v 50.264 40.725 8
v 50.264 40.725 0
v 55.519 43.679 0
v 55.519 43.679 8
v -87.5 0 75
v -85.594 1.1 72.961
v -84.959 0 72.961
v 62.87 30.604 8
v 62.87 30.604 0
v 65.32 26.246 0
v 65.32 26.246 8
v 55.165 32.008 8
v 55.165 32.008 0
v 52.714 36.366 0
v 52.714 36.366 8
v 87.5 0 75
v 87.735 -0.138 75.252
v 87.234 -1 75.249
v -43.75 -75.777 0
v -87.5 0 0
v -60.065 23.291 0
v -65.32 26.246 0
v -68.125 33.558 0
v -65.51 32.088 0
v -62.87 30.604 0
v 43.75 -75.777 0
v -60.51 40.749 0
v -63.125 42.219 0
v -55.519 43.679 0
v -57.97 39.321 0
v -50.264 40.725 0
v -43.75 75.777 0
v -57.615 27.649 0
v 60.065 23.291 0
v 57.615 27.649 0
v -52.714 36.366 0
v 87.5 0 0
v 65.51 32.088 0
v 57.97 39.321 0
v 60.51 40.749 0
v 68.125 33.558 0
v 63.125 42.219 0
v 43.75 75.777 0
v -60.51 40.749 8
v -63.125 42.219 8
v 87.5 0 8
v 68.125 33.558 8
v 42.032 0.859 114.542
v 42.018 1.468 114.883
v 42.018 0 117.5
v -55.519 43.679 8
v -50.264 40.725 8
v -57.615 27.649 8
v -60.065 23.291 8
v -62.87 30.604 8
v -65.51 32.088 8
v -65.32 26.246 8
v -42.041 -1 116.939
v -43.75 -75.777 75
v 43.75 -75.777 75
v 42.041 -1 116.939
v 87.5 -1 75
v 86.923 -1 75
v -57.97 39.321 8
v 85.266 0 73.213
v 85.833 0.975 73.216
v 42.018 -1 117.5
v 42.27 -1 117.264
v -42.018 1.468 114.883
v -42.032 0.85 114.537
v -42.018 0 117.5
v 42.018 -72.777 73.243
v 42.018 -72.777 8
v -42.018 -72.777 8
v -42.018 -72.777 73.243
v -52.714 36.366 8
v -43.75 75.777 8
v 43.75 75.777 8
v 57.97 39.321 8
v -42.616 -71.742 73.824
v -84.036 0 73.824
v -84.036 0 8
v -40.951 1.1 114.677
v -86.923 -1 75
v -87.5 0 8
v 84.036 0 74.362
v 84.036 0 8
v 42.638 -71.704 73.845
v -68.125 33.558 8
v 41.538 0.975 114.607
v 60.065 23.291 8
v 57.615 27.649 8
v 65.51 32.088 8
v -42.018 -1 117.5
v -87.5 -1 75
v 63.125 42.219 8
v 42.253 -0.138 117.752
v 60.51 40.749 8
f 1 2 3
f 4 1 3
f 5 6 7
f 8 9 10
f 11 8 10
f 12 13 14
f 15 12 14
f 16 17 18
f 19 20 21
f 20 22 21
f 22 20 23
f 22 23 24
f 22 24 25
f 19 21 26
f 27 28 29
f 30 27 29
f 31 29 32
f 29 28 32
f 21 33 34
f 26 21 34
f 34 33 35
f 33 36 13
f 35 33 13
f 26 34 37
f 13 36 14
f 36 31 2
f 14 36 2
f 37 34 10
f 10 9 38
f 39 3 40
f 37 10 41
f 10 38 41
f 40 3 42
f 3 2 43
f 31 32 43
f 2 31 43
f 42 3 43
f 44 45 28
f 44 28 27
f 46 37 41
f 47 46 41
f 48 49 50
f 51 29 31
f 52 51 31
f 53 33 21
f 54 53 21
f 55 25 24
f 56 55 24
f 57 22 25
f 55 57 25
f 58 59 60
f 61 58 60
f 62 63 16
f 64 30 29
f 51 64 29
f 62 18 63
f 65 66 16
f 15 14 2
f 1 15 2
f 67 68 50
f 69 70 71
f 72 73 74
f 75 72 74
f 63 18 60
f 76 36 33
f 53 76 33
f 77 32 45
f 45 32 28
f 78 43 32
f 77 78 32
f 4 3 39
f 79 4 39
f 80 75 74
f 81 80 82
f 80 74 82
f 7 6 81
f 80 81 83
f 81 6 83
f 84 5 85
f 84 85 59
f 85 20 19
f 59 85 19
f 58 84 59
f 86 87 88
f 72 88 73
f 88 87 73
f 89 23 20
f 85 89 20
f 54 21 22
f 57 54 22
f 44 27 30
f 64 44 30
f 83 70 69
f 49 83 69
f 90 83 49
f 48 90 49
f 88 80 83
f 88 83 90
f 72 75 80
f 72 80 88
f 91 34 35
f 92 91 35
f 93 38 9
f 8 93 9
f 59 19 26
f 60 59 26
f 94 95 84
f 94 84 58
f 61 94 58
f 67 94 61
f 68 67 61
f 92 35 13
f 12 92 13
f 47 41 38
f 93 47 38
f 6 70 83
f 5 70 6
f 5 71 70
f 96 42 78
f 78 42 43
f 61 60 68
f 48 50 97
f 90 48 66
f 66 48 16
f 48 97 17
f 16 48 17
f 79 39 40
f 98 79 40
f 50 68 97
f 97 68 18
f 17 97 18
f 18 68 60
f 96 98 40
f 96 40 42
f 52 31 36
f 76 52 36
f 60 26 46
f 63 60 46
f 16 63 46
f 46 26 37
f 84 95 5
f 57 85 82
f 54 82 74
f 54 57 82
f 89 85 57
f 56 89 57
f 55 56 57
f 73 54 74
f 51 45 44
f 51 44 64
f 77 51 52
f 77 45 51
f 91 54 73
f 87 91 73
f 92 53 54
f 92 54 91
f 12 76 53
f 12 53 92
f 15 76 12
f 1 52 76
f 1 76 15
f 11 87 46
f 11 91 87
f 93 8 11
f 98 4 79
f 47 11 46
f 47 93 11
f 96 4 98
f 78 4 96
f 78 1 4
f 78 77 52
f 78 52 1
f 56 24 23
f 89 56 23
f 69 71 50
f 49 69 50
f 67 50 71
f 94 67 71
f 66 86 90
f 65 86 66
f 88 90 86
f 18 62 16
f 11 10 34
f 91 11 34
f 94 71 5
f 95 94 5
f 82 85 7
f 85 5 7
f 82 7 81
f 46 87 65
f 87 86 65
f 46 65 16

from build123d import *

# Parameters (mm, degrees)
F0_W      = 50
F0_H      = 12.5
F1_DEPTH  = 8
F2_DEPTH  = 75
F4_DEPTH  = 8
F7_DEPTH  = 3
F8_DEPTH  = 1
F11_DEPTH = 3
F14_DEPTH = 3
F15_DEPTH = 8
F16_DEPTH = 25
F17_DEPTH = 8


# Not quite as in the source:
# - a feature names something its author has since deleted; it is built from what else it names


with BuildPart() as f1:
    # F0 (on Top) → F1 (new body)
    with BuildSketch(Plane.XY):
        Polygon((-42.0179491924, 72.7772228311), (-60.5095952989, 40.7487522591), (-57.9695070384, 39.3207329262), (-55.5194165334, 43.6791064608), (-50.2642610162, 40.7248836223), (-52.7144317239, 36.366367418), (-57.615009792, 27.6494680496), (-60.0654171506, 23.2910848888), (-65.3204122546, 26.2455930623), (-62.870004896, 30.6039762231), (-65.5097997054, 32.0881441788), (-84.0358983849, 0), (-42.0179491924, -72.7772228311), (42.0179491924, -72.7772228311), (84.0358983849, 0), (65.5097997054, 32.0881441788), (62.870004896, 30.6039762231), (65.3204122546, 26.2455930623), (60.0654171506, 23.2910848888), (57.615009792, 27.6494680496), (55.164720758, 32.0079177338), (52.7144317239, 36.366367418), (50.2642610162, 40.7248836223), (55.5194165334, 43.6791064608), (57.9695070384, 39.3207329262), (60.5095952989, 40.7487522591), (42.0179491924, 72.7772228311), align=None)
        with Locations((0, 54.5829171234)):
            Rectangle(F0_W, F0_H, mode=Mode.SUBTRACT)
    extrude(amount=F1_DEPTH)

    # F0 (on Top) → F2 (join)
    with BuildSketch(Plane.XY):
        Polygon((43.75, -75.7772228311), (87.5, 0), (84.0358983849, 0), (42.0179491924, -72.7772228311), (-42.0179491924, -72.7772228311), (-84.0358983849, 0), (-87.5, 0), (-43.75, -75.7772228311), align=None)
    extrude(amount=F2_DEPTH)

    # F0 (on Top) → F4 (join)
    with BuildSketch(Plane.XY):
        Polygon((43.75, 75.7772228311), (-43.75, 75.7772228311), (-63.1248363216, 42.2190219338), (-60.5095952989, 40.7487522591), (-42.0179491924, 72.7772228311), (42.0179491924, 72.7772228311), (60.5095952989, 40.7487522591), (63.1248363216, 42.2190219338), align=None)
    extrude(amount=F4_DEPTH)

    # F6 (on face) → F7 (join)
    with BuildSketch(Plane(origin=(0, -50.1312366318, 89.3836679776), x_dir=(1, 0, 0), z_dir=(0, 0.4891706574, -0.872188092))):
        Polygon((43.75, 29.4041920927), (0, 29.4041920927), (-43.75, 29.4041920927), (-42.01795, -57.4775522498), (42.01795, -57.4775522498), align=None)
    extrude(amount=F7_DEPTH)

    # F3 (on Front) → F8 (join)
    with BuildSketch(Plane.XZ):
        Polygon((-42.01795, 114.5), (0, 114.5), (42.01795, 114.5), (84.0359, 75), (87.5, 75), (42.01795, 117.5), (0, 117.5), (-42.01795, 117.5), (-87.5, 75), (-84.0359, 75), align=None)
    extrude(amount=F8_DEPTH)

    # F10 (on face) → F11 (join)
    with BuildSketch(Plane(origin=(-67.6846727043, -39.0777640058, 72.4338274863), x_dir=(0.7723629594, -0.3015876344, 0.5590173143), z_dir=(-0.6351814378, -0.3667221741, 0.6797495039))):
        Polygon((33.2314262259, 55.789645187), (-25.6554603702, 35.6104118215), (30.9888924807, -31.0804218073), align=None)
    extrude(amount=-F11_DEPTH)

    # F13 (on face) → F14 (join)
    with BuildSketch(Plane(origin=(67.6756688636, -39.5950852503, 72.4241918832), x_dir=(0.7733047167, 0.3041472681, -0.556322078), z_dir=(-0.6340345536, 0.3709553614, -0.6785221475))):
        Polygon((-30.939509805, 30.5117392321), (-32.8751652468, -56.3649154418), (25.9400068576, -35.9776056011), align=None)
    extrude(amount=F14_DEPTH)

    # F0 (on Top) → F15 (join)
    with BuildSketch(Plane.XY):
        with Locations((0, 54.5829171234)):
            Rectangle(F0_W, F0_H)
    extrude(amount=F15_DEPTH)

    # F0 (on Top) → F16 (cut)
    with BuildSketch(Plane.XY):
        Polygon((-57.9695070384, 39.3207329262), (-60.5095952989, 40.7487522591), (-65.5097997054, 32.0881441788), (-62.870004896, 30.6039762231), (-57.615009792, 27.6494680496), (-52.7144317239, 36.366367418), align=None)
    extrude(amount=-F16_DEPTH, mode=Mode.SUBTRACT)

    # F0 (on Top) → F17 (join)
    with BuildSketch(Plane.XY):
        Polygon((-65.5097997054, 32.0881441788), (-68.125, 33.5584843966), (-87.5, 0), (-84.0358983849, 0), align=None)
        Polygon((87.5, 0), (68.125, 33.5584843966), (65.5097997054, 32.0881441788), (84.0358983849, 0), align=None)
    extrude(amount=F17_DEPTH)


solid = f1.part
